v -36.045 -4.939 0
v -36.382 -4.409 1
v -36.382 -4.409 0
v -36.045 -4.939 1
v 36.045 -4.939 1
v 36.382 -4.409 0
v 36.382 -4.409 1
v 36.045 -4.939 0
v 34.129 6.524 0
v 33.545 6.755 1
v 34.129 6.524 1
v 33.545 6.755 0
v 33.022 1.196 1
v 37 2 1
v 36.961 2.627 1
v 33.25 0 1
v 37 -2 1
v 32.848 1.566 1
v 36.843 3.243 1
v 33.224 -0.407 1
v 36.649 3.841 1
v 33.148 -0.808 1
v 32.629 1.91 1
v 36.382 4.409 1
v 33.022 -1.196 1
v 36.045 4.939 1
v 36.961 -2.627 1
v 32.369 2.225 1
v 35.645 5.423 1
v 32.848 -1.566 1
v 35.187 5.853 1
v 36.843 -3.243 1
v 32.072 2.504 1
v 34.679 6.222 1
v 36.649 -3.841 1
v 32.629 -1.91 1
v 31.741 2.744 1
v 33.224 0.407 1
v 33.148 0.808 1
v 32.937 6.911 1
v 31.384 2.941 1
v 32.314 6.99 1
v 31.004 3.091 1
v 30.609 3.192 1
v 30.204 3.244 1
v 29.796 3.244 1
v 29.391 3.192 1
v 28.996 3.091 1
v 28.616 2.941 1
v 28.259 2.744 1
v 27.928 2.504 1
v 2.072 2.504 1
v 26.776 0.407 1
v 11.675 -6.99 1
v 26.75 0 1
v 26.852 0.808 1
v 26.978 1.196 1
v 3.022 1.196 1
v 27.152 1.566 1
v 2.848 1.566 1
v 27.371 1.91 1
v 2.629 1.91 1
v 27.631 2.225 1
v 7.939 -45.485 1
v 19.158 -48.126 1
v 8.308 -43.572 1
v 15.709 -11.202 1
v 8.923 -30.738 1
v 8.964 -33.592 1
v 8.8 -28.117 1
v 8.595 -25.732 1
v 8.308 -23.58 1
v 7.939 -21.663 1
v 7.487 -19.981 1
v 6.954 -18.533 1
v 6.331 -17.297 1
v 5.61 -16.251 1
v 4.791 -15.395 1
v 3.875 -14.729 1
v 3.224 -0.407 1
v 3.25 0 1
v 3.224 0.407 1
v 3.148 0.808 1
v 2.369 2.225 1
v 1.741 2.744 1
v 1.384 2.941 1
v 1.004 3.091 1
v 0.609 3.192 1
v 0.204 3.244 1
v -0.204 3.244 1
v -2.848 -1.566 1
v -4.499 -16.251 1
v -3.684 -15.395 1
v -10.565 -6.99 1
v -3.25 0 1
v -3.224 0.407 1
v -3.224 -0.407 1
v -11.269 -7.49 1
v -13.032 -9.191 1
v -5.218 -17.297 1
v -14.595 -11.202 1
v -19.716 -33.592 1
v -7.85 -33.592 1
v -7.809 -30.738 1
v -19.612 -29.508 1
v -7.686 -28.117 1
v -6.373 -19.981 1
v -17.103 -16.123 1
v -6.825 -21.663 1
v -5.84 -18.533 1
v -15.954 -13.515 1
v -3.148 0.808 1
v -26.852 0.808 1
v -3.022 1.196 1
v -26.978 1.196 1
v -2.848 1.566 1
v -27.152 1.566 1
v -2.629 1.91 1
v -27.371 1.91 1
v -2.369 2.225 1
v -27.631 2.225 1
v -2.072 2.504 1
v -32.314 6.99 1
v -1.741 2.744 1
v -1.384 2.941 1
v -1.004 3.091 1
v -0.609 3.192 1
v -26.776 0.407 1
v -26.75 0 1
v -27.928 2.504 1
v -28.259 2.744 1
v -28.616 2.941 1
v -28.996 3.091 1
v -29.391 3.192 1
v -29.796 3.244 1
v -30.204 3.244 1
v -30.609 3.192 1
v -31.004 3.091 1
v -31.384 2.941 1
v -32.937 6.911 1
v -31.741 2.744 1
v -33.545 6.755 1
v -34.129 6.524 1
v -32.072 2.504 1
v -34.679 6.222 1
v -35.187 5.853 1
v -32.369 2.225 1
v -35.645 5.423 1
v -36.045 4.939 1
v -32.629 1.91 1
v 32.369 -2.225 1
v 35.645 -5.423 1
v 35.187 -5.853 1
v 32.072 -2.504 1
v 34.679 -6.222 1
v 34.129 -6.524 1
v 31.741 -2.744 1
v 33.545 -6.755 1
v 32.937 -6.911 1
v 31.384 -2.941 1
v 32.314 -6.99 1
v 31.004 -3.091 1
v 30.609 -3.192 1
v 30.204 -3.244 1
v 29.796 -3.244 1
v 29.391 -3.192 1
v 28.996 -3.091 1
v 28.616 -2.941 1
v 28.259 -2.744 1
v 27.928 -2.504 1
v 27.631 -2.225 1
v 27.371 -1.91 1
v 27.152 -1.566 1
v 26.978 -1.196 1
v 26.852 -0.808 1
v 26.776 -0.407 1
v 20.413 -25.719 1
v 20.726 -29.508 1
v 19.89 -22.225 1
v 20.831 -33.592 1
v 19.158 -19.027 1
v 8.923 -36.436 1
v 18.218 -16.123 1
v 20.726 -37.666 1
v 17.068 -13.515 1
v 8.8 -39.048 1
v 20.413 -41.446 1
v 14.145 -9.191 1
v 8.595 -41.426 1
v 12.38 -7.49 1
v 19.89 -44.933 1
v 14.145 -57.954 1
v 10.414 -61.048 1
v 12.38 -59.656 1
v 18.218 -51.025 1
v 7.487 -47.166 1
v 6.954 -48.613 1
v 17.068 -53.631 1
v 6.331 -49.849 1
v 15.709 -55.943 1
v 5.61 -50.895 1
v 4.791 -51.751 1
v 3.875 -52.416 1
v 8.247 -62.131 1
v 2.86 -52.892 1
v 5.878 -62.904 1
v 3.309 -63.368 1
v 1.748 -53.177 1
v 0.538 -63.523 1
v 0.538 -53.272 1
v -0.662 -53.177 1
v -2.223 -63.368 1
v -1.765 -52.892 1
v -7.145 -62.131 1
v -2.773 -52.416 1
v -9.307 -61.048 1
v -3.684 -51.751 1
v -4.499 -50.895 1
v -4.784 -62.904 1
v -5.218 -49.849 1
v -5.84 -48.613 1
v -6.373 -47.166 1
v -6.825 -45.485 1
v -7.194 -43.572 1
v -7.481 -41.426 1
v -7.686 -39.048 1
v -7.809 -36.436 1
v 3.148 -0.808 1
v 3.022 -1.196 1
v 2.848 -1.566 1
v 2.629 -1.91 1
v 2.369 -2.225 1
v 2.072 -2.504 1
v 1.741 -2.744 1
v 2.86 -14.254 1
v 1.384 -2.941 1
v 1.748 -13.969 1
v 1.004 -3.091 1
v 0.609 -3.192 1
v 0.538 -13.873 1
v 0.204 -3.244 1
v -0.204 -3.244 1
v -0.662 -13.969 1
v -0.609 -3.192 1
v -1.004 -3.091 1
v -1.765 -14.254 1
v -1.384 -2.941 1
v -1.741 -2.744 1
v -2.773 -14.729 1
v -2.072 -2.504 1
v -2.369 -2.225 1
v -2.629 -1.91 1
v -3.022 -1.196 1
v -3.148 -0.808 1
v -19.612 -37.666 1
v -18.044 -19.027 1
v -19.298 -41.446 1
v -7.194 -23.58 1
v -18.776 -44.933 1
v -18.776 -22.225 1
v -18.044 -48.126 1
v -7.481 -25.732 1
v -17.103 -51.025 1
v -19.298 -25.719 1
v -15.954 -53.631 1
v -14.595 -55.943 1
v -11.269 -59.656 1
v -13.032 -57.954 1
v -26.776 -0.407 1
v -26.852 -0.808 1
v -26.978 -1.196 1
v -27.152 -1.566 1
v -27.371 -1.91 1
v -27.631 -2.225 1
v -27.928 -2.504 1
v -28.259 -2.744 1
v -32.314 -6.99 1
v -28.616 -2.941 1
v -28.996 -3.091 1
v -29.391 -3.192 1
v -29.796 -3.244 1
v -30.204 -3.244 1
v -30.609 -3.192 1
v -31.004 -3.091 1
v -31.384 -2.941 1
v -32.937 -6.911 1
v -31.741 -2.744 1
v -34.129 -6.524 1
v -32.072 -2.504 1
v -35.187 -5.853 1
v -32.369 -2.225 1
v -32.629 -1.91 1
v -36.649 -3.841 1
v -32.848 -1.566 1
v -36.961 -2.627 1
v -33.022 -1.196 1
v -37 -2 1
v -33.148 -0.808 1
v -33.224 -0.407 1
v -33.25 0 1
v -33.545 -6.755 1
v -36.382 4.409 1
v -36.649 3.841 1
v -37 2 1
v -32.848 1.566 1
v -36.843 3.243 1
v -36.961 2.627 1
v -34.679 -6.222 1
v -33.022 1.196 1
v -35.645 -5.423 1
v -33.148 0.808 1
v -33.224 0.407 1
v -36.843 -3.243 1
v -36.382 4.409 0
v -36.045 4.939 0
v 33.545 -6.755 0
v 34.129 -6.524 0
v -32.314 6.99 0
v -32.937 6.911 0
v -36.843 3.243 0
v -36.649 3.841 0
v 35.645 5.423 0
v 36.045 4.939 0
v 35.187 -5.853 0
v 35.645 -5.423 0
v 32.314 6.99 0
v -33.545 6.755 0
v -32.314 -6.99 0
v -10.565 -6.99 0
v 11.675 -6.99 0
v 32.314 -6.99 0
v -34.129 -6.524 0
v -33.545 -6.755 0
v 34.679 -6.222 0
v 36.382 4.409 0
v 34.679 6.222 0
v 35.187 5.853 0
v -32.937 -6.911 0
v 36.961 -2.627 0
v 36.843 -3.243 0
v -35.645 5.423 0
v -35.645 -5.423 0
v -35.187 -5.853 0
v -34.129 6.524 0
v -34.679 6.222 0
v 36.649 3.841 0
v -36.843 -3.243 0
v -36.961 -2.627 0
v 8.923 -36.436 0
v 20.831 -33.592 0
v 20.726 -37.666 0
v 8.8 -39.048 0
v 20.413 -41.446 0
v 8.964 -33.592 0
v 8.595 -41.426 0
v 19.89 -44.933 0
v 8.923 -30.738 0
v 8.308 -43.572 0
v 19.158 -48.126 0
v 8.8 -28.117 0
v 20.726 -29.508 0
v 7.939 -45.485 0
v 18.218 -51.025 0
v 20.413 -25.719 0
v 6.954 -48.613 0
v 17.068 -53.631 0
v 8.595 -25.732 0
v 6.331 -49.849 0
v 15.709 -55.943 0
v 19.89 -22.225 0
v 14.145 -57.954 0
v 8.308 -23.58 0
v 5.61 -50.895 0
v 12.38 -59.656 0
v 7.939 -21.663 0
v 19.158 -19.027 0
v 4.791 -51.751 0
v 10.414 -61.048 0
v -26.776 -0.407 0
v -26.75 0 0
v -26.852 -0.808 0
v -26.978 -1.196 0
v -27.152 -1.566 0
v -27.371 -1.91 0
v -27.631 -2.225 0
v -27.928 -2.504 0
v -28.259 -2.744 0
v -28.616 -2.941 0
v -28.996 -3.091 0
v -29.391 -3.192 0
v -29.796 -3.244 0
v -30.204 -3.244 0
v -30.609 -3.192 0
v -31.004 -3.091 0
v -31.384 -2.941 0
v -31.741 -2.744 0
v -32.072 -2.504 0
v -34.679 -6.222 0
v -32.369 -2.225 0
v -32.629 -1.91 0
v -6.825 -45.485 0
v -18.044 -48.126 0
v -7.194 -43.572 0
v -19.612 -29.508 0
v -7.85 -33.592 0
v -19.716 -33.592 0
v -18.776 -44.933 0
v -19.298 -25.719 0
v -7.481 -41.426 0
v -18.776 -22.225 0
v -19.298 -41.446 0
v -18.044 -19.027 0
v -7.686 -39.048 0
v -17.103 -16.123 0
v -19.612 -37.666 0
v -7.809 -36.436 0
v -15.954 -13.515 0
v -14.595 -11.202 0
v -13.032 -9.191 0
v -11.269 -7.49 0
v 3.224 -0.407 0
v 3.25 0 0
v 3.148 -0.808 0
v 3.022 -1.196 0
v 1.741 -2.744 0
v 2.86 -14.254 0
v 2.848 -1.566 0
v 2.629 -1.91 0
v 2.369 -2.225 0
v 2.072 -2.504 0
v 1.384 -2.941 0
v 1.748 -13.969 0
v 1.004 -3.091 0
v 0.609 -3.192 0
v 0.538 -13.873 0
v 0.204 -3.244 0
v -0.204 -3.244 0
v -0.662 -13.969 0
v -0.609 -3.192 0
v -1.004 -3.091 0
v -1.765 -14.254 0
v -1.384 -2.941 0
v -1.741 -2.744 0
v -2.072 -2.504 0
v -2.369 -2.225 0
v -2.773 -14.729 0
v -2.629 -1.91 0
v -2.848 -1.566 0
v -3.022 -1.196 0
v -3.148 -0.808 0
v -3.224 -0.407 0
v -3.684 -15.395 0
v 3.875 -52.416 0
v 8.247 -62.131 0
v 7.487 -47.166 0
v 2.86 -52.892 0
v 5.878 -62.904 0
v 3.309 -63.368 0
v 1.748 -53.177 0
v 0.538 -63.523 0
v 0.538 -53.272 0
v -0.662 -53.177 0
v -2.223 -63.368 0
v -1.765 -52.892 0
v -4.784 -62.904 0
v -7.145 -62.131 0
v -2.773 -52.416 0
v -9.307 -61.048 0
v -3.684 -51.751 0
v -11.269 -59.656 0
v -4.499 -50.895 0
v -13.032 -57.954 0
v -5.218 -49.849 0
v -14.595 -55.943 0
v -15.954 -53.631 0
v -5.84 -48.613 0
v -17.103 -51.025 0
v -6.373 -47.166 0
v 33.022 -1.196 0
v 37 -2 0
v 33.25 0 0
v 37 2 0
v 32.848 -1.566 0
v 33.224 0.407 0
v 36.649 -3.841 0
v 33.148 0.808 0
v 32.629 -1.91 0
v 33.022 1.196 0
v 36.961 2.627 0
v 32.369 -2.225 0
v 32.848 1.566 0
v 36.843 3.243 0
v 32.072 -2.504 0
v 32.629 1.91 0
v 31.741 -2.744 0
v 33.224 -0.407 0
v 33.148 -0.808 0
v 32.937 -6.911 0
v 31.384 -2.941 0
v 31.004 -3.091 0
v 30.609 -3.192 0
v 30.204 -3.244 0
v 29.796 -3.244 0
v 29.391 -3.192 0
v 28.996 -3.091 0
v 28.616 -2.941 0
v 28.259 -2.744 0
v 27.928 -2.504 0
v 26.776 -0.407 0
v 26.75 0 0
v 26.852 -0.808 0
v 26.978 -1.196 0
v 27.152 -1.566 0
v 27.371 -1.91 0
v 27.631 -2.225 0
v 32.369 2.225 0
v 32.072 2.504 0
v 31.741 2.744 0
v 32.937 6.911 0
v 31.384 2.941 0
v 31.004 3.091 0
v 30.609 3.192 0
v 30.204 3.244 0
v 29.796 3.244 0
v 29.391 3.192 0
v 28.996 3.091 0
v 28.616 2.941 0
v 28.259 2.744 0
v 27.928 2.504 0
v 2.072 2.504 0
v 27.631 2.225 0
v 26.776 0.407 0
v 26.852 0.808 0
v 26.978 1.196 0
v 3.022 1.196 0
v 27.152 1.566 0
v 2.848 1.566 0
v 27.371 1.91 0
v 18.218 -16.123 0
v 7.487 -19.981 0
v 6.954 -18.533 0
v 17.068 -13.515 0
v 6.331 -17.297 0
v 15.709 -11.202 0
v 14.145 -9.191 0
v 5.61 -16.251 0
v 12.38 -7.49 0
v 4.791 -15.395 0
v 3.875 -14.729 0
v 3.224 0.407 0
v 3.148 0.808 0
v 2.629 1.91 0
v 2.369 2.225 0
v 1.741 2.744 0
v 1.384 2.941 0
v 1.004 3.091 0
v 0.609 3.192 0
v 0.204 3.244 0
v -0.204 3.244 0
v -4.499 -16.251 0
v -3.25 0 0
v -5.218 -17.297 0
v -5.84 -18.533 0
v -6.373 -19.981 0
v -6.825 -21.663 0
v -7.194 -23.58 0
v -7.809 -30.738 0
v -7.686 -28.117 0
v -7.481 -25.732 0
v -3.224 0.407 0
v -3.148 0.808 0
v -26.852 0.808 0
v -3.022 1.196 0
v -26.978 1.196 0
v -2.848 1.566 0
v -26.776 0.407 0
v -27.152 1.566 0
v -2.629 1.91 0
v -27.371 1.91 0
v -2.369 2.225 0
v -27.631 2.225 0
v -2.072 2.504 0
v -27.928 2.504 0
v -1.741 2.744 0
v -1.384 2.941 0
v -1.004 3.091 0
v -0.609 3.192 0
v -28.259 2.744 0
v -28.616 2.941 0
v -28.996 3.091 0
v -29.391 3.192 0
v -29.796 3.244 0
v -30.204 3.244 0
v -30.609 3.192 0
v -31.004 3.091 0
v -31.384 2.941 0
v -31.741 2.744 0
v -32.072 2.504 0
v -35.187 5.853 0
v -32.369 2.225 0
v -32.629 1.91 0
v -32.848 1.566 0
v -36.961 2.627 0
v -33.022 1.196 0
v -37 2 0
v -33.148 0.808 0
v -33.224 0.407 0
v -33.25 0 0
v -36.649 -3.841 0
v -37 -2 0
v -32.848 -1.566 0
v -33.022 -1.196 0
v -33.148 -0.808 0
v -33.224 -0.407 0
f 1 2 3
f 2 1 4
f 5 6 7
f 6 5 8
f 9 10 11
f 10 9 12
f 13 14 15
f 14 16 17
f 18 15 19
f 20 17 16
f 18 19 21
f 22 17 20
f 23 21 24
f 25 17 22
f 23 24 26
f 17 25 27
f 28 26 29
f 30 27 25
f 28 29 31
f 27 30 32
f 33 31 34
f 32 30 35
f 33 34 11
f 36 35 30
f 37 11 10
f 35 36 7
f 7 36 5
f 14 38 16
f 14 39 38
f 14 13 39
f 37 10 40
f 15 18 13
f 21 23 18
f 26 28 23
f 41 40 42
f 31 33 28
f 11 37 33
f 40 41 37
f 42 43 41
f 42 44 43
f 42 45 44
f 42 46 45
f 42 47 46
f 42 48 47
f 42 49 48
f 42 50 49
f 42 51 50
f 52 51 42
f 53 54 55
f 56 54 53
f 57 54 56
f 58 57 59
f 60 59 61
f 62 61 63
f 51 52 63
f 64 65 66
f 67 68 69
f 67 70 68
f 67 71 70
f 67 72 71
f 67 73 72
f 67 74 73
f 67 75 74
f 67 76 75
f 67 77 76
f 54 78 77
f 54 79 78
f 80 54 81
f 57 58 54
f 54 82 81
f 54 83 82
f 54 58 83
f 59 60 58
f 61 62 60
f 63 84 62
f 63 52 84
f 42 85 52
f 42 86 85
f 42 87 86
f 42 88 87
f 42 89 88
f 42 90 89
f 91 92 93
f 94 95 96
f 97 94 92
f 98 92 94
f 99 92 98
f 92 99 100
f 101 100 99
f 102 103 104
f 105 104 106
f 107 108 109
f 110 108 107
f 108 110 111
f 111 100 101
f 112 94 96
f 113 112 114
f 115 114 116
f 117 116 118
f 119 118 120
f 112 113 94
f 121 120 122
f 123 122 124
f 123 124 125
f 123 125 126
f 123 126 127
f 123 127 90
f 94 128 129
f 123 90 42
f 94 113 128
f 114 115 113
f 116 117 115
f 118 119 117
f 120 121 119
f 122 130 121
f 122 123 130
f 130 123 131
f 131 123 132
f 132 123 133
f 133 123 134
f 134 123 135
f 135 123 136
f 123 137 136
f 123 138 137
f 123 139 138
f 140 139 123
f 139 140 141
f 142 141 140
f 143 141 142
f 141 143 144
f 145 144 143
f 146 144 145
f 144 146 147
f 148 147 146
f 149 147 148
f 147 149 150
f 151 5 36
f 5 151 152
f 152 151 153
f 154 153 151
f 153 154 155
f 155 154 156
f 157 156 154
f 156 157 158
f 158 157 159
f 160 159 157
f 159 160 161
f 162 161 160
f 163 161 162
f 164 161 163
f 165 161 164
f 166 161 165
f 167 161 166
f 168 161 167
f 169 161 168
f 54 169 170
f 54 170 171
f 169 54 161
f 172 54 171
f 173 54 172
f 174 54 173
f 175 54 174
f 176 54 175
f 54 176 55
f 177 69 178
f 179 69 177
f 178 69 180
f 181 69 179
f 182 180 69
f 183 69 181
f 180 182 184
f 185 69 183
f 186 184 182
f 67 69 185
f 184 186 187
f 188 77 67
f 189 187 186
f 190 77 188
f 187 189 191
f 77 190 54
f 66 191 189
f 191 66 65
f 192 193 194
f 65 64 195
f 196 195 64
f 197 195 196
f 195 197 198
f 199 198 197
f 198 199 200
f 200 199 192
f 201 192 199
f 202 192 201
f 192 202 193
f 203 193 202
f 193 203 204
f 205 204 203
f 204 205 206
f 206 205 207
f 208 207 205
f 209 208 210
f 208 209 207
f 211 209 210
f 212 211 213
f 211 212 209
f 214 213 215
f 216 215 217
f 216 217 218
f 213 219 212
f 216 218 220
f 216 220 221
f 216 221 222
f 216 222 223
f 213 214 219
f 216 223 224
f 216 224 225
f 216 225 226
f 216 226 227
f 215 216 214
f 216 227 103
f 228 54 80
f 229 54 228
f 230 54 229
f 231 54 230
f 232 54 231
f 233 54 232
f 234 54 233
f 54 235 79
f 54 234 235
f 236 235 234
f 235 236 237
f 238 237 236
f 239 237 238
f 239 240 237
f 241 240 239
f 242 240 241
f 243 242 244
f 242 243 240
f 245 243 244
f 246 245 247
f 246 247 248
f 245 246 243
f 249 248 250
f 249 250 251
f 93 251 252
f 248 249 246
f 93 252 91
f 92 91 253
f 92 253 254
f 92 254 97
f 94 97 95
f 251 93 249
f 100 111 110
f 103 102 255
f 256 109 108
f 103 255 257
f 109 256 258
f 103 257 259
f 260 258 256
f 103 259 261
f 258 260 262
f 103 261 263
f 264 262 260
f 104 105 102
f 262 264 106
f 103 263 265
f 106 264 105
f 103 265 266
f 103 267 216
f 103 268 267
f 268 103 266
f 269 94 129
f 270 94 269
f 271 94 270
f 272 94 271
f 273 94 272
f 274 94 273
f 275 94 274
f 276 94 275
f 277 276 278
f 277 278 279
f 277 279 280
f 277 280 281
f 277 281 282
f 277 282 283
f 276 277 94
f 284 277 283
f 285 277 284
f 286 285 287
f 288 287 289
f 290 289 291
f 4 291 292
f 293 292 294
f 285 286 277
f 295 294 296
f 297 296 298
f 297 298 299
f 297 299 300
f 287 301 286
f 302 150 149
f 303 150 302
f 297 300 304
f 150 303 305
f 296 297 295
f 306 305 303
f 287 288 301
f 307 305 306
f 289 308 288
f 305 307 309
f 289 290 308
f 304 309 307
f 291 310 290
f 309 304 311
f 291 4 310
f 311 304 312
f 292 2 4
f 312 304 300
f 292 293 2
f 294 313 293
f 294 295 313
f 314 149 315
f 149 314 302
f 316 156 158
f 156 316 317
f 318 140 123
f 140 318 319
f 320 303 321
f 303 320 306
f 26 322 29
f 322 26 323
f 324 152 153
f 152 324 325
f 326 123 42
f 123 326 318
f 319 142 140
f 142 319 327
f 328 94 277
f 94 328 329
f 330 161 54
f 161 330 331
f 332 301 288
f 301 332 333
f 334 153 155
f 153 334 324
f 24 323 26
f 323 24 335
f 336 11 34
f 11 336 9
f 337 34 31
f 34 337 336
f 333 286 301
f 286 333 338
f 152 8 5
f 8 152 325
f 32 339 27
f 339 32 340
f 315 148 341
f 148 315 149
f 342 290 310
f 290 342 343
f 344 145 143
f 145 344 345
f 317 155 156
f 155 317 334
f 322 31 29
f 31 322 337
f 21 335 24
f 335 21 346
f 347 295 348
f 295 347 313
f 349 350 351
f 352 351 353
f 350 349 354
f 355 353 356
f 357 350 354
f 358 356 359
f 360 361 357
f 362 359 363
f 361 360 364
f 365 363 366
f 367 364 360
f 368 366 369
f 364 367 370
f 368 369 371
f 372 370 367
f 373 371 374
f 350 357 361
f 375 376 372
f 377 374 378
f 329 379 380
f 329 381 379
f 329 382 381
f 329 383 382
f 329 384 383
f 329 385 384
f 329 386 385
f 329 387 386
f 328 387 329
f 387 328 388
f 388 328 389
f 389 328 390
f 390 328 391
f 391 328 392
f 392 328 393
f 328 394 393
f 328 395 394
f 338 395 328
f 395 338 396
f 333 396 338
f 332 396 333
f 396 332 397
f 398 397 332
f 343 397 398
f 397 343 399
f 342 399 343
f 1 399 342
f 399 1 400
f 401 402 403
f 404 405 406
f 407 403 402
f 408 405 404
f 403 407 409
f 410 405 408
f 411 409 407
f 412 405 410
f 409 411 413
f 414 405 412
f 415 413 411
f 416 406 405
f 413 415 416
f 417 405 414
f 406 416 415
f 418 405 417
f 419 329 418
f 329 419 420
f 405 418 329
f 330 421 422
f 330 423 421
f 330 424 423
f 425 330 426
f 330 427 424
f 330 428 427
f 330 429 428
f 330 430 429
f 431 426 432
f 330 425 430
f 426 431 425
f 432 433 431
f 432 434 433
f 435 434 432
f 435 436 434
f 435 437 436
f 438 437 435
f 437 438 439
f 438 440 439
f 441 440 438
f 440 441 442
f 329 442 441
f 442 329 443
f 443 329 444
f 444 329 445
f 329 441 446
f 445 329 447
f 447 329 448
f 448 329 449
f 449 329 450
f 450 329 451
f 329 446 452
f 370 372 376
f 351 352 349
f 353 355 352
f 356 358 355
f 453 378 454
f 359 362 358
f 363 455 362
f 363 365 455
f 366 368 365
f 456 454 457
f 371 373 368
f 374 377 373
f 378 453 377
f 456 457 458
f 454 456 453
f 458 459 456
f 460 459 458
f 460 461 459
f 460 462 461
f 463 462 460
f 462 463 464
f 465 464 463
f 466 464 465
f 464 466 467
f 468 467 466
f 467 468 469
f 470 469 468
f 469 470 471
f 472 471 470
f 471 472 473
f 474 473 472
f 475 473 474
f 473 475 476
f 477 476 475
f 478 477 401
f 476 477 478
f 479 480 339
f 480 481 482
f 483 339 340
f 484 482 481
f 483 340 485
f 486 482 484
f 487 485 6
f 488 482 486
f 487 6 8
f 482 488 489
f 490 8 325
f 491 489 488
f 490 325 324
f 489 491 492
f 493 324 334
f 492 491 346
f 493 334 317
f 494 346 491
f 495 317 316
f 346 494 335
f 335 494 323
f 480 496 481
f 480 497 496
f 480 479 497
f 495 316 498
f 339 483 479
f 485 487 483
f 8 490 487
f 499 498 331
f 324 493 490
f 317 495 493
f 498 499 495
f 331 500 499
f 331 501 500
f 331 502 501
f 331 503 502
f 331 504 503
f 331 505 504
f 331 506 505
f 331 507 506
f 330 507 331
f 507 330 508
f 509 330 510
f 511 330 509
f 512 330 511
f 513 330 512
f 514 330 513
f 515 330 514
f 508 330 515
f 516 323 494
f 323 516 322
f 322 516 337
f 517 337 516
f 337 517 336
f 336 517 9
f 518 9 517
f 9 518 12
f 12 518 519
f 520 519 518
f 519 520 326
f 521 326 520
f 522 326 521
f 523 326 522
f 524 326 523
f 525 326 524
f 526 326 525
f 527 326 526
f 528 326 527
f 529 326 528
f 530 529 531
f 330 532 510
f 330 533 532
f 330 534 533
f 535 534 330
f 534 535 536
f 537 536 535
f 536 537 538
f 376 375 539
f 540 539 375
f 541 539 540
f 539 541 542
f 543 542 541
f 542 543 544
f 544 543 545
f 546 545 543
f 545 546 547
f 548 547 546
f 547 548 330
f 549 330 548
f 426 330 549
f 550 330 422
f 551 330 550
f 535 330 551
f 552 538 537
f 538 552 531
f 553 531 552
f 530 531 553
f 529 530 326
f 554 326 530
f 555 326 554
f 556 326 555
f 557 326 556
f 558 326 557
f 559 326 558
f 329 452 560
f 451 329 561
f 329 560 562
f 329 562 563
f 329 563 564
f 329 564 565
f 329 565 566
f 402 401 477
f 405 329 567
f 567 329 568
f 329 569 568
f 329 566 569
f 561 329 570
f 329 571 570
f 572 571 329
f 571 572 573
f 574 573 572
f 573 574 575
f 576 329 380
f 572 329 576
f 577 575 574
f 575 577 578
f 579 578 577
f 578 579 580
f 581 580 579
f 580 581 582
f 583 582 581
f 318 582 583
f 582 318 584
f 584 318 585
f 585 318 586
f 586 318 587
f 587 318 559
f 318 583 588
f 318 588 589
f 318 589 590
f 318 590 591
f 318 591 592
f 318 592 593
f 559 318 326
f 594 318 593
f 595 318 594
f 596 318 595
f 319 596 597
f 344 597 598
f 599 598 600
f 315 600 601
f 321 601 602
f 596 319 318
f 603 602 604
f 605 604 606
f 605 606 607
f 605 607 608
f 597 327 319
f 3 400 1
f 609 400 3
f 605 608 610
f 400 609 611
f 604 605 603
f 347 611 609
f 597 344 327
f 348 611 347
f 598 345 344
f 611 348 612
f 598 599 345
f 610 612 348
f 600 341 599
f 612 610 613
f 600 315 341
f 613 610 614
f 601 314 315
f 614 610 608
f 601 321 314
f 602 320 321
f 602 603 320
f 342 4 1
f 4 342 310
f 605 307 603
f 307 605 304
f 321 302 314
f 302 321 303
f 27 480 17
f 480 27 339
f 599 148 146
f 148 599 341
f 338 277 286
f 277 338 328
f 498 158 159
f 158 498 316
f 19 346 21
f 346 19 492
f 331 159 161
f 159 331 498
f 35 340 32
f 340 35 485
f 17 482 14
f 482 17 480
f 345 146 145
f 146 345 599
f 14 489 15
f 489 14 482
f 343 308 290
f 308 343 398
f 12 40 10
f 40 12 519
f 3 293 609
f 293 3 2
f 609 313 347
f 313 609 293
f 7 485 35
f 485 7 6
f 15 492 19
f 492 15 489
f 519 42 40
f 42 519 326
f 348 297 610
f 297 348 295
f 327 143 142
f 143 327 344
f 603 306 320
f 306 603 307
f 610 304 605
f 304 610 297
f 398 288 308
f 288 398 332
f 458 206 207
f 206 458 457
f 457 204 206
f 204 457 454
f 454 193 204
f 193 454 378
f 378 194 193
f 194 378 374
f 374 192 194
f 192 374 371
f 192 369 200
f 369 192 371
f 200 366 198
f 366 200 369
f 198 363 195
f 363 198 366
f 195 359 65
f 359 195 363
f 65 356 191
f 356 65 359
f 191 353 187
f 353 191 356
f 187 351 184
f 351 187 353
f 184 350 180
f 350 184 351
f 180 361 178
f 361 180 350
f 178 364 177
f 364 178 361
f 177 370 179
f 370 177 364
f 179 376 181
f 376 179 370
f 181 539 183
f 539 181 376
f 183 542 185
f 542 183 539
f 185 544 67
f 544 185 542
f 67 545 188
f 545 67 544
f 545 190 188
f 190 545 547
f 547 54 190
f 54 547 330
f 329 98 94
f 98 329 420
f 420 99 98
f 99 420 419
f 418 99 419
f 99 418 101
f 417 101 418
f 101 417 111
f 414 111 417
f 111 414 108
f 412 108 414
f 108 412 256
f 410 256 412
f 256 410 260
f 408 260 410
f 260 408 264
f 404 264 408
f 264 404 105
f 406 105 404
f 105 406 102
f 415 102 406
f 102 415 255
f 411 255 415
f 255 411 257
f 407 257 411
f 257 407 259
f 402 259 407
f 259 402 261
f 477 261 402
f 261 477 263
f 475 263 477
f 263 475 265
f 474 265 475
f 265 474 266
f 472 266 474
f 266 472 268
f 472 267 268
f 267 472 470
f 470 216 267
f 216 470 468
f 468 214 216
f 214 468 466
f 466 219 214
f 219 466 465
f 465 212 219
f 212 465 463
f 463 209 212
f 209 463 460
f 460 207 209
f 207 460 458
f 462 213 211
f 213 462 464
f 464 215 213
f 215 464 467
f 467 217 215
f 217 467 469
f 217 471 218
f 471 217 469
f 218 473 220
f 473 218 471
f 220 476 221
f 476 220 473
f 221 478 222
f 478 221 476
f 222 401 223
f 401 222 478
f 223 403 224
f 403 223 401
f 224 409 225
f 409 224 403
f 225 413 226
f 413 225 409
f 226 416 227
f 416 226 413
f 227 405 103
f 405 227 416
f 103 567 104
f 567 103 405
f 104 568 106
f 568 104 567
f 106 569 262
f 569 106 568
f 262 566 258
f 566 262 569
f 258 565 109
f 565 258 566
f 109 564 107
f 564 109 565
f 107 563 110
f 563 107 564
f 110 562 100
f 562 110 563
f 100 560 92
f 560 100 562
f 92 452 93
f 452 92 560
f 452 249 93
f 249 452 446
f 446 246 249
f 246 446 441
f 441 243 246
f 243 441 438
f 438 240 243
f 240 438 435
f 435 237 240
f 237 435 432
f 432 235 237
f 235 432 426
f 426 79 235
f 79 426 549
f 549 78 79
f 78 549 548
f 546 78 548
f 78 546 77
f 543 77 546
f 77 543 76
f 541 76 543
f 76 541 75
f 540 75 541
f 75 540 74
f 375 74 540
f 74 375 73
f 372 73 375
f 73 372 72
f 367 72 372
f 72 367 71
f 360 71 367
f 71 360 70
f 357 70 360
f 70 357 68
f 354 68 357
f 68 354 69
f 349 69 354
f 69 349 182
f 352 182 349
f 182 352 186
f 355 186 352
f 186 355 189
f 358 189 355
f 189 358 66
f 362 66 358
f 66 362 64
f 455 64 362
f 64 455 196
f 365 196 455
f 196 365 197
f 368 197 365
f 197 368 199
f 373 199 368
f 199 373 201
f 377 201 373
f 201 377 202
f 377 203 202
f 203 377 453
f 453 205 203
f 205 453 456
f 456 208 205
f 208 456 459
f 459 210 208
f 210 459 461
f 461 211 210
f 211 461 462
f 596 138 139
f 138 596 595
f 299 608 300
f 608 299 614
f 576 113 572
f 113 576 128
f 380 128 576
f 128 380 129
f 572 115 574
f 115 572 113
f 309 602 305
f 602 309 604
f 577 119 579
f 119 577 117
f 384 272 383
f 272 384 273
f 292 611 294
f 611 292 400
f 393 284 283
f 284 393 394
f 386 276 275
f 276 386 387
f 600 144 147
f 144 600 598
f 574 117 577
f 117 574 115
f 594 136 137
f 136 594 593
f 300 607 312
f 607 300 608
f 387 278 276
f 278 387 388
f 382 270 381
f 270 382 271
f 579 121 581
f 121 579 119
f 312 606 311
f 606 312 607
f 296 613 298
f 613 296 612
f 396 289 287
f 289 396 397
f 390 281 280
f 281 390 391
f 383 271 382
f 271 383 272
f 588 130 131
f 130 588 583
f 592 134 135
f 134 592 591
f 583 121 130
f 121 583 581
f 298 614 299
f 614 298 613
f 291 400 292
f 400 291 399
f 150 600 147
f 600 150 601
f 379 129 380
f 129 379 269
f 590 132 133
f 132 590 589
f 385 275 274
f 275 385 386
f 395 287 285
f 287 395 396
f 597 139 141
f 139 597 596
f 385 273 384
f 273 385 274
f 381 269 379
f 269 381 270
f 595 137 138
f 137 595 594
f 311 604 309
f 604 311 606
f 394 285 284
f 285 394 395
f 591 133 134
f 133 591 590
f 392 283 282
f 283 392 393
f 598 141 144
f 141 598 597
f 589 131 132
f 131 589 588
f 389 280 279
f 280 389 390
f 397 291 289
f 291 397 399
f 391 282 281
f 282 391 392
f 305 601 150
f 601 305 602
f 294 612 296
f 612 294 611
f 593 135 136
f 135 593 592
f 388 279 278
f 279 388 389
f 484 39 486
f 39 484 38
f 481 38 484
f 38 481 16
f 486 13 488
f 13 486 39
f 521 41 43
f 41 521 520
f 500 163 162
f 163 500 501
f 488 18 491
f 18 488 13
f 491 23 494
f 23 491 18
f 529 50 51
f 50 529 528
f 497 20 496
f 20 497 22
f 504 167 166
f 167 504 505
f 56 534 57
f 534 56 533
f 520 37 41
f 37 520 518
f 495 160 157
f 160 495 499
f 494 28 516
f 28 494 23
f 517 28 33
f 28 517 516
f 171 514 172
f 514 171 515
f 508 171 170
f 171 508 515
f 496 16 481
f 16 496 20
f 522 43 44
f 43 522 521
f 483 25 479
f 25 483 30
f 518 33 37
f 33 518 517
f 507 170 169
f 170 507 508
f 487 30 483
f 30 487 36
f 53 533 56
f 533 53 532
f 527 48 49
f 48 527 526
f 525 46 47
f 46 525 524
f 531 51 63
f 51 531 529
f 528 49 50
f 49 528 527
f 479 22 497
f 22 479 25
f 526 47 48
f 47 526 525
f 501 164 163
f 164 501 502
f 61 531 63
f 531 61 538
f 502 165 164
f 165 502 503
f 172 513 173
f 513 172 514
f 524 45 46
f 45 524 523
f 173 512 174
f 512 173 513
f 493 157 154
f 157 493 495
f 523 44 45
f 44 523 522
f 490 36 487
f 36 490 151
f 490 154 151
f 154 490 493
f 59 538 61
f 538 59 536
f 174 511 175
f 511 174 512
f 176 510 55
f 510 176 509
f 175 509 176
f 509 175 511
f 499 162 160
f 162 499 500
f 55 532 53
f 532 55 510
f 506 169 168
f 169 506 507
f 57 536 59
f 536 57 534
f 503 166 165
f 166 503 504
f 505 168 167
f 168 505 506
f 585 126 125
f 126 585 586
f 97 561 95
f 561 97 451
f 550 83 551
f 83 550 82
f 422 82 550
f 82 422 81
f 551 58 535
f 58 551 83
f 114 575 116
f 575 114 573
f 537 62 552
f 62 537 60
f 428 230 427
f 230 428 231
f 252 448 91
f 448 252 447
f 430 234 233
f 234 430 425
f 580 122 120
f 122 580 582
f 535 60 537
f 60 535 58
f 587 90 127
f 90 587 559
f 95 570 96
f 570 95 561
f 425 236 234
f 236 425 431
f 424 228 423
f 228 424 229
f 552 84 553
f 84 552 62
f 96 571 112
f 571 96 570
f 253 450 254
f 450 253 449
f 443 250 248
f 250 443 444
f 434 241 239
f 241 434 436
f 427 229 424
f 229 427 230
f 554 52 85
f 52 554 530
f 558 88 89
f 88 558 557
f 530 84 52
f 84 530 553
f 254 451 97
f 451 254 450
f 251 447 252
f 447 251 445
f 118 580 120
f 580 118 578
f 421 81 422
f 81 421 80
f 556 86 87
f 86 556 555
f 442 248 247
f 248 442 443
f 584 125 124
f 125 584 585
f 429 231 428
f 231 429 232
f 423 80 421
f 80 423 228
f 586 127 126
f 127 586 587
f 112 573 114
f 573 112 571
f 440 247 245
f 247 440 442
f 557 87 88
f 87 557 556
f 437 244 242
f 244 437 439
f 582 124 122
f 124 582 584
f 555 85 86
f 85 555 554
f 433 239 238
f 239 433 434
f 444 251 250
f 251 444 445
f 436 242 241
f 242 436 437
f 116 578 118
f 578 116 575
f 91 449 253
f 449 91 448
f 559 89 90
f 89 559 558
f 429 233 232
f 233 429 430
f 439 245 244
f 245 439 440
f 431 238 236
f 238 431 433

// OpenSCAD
$fn = 50;


difference() {
	union() {
		translate(v = [0, 0, 0]) {
			rotate(a = [0, 0, 0]) {
				hull() {
					translate(v = [-32.0000000000, 2.0000000000, 0]) {
						rotate(a = [0, 0, 0]) {
							translate(v = [0, 0, 0]) {
								rotate(a = [0, 0, 0]) {
									cylinder(h = 1, r = 5);
								}
							}
						}
					}
					translate(v = [32.0000000000, 2.0000000000, 0]) {
						rotate(a = [0, 0, 0]) {
							translate(v = [0, 0, 0]) {
								rotate(a = [0, 0, 0]) {
									cylinder(h = 1, r = 5);
								}
							}
						}
					}
					translate(v = [-32.0000000000, -2.0000000000, 0]) {
						rotate(a = [0, 0, 0]) {
							translate(v = [0, 0, 0]) {
								rotate(a = [0, 0, 0]) {
									cylinder(h = 1, r = 5);
								}
							}
						}
					}
					translate(v = [32.0000000000, -2.0000000000, 0]) {
						rotate(a = [0, 0, 0]) {
							translate(v = [0, 0, 0]) {
								rotate(a = [0, 0, 0]) {
									cylinder(h = 1, r = 5);
								}
							}
						}
					}
				}
			}
		}
		translate(v = [0, -5, 0]) {
			rotate(a = [0, 0, 0]) {
				linear_extrude(height = 1) {
					text(font = "DejaVu Sans Mono:style=Bold", halign = "center", size = 57.0000000000, text = "O", valign = "top");
				}
			}
		}
	}
	union() {
		translate(v = [-30.0000000000, 0.0000000000, -125.0000000000]) {
			rotate(a = [0, 0, 0]) {
				cylinder(h = 250, r = 3.2500000000);
			}
		}
		translate(v = [30.0000000000, 0.0000000000, -125.0000000000]) {
			rotate(a = [0, 0, 0]) {
				cylinder(h = 250, r = 3.2500000000);
			}
		}
		translate(v = [30.0000000000, 0.0000000000, -125.0000000000]) {
			rotate(a = [0, 0, 0]) {
				cylinder(h = 250, r = 3.2500000000);
			}
		}
		translate(v = [0, 0, -125.0000000000]) {
			rotate(a = [0, 0, 0]) {
				cylinder(h = 250, r = 3.2500000000);
			}
		}
	}
}
